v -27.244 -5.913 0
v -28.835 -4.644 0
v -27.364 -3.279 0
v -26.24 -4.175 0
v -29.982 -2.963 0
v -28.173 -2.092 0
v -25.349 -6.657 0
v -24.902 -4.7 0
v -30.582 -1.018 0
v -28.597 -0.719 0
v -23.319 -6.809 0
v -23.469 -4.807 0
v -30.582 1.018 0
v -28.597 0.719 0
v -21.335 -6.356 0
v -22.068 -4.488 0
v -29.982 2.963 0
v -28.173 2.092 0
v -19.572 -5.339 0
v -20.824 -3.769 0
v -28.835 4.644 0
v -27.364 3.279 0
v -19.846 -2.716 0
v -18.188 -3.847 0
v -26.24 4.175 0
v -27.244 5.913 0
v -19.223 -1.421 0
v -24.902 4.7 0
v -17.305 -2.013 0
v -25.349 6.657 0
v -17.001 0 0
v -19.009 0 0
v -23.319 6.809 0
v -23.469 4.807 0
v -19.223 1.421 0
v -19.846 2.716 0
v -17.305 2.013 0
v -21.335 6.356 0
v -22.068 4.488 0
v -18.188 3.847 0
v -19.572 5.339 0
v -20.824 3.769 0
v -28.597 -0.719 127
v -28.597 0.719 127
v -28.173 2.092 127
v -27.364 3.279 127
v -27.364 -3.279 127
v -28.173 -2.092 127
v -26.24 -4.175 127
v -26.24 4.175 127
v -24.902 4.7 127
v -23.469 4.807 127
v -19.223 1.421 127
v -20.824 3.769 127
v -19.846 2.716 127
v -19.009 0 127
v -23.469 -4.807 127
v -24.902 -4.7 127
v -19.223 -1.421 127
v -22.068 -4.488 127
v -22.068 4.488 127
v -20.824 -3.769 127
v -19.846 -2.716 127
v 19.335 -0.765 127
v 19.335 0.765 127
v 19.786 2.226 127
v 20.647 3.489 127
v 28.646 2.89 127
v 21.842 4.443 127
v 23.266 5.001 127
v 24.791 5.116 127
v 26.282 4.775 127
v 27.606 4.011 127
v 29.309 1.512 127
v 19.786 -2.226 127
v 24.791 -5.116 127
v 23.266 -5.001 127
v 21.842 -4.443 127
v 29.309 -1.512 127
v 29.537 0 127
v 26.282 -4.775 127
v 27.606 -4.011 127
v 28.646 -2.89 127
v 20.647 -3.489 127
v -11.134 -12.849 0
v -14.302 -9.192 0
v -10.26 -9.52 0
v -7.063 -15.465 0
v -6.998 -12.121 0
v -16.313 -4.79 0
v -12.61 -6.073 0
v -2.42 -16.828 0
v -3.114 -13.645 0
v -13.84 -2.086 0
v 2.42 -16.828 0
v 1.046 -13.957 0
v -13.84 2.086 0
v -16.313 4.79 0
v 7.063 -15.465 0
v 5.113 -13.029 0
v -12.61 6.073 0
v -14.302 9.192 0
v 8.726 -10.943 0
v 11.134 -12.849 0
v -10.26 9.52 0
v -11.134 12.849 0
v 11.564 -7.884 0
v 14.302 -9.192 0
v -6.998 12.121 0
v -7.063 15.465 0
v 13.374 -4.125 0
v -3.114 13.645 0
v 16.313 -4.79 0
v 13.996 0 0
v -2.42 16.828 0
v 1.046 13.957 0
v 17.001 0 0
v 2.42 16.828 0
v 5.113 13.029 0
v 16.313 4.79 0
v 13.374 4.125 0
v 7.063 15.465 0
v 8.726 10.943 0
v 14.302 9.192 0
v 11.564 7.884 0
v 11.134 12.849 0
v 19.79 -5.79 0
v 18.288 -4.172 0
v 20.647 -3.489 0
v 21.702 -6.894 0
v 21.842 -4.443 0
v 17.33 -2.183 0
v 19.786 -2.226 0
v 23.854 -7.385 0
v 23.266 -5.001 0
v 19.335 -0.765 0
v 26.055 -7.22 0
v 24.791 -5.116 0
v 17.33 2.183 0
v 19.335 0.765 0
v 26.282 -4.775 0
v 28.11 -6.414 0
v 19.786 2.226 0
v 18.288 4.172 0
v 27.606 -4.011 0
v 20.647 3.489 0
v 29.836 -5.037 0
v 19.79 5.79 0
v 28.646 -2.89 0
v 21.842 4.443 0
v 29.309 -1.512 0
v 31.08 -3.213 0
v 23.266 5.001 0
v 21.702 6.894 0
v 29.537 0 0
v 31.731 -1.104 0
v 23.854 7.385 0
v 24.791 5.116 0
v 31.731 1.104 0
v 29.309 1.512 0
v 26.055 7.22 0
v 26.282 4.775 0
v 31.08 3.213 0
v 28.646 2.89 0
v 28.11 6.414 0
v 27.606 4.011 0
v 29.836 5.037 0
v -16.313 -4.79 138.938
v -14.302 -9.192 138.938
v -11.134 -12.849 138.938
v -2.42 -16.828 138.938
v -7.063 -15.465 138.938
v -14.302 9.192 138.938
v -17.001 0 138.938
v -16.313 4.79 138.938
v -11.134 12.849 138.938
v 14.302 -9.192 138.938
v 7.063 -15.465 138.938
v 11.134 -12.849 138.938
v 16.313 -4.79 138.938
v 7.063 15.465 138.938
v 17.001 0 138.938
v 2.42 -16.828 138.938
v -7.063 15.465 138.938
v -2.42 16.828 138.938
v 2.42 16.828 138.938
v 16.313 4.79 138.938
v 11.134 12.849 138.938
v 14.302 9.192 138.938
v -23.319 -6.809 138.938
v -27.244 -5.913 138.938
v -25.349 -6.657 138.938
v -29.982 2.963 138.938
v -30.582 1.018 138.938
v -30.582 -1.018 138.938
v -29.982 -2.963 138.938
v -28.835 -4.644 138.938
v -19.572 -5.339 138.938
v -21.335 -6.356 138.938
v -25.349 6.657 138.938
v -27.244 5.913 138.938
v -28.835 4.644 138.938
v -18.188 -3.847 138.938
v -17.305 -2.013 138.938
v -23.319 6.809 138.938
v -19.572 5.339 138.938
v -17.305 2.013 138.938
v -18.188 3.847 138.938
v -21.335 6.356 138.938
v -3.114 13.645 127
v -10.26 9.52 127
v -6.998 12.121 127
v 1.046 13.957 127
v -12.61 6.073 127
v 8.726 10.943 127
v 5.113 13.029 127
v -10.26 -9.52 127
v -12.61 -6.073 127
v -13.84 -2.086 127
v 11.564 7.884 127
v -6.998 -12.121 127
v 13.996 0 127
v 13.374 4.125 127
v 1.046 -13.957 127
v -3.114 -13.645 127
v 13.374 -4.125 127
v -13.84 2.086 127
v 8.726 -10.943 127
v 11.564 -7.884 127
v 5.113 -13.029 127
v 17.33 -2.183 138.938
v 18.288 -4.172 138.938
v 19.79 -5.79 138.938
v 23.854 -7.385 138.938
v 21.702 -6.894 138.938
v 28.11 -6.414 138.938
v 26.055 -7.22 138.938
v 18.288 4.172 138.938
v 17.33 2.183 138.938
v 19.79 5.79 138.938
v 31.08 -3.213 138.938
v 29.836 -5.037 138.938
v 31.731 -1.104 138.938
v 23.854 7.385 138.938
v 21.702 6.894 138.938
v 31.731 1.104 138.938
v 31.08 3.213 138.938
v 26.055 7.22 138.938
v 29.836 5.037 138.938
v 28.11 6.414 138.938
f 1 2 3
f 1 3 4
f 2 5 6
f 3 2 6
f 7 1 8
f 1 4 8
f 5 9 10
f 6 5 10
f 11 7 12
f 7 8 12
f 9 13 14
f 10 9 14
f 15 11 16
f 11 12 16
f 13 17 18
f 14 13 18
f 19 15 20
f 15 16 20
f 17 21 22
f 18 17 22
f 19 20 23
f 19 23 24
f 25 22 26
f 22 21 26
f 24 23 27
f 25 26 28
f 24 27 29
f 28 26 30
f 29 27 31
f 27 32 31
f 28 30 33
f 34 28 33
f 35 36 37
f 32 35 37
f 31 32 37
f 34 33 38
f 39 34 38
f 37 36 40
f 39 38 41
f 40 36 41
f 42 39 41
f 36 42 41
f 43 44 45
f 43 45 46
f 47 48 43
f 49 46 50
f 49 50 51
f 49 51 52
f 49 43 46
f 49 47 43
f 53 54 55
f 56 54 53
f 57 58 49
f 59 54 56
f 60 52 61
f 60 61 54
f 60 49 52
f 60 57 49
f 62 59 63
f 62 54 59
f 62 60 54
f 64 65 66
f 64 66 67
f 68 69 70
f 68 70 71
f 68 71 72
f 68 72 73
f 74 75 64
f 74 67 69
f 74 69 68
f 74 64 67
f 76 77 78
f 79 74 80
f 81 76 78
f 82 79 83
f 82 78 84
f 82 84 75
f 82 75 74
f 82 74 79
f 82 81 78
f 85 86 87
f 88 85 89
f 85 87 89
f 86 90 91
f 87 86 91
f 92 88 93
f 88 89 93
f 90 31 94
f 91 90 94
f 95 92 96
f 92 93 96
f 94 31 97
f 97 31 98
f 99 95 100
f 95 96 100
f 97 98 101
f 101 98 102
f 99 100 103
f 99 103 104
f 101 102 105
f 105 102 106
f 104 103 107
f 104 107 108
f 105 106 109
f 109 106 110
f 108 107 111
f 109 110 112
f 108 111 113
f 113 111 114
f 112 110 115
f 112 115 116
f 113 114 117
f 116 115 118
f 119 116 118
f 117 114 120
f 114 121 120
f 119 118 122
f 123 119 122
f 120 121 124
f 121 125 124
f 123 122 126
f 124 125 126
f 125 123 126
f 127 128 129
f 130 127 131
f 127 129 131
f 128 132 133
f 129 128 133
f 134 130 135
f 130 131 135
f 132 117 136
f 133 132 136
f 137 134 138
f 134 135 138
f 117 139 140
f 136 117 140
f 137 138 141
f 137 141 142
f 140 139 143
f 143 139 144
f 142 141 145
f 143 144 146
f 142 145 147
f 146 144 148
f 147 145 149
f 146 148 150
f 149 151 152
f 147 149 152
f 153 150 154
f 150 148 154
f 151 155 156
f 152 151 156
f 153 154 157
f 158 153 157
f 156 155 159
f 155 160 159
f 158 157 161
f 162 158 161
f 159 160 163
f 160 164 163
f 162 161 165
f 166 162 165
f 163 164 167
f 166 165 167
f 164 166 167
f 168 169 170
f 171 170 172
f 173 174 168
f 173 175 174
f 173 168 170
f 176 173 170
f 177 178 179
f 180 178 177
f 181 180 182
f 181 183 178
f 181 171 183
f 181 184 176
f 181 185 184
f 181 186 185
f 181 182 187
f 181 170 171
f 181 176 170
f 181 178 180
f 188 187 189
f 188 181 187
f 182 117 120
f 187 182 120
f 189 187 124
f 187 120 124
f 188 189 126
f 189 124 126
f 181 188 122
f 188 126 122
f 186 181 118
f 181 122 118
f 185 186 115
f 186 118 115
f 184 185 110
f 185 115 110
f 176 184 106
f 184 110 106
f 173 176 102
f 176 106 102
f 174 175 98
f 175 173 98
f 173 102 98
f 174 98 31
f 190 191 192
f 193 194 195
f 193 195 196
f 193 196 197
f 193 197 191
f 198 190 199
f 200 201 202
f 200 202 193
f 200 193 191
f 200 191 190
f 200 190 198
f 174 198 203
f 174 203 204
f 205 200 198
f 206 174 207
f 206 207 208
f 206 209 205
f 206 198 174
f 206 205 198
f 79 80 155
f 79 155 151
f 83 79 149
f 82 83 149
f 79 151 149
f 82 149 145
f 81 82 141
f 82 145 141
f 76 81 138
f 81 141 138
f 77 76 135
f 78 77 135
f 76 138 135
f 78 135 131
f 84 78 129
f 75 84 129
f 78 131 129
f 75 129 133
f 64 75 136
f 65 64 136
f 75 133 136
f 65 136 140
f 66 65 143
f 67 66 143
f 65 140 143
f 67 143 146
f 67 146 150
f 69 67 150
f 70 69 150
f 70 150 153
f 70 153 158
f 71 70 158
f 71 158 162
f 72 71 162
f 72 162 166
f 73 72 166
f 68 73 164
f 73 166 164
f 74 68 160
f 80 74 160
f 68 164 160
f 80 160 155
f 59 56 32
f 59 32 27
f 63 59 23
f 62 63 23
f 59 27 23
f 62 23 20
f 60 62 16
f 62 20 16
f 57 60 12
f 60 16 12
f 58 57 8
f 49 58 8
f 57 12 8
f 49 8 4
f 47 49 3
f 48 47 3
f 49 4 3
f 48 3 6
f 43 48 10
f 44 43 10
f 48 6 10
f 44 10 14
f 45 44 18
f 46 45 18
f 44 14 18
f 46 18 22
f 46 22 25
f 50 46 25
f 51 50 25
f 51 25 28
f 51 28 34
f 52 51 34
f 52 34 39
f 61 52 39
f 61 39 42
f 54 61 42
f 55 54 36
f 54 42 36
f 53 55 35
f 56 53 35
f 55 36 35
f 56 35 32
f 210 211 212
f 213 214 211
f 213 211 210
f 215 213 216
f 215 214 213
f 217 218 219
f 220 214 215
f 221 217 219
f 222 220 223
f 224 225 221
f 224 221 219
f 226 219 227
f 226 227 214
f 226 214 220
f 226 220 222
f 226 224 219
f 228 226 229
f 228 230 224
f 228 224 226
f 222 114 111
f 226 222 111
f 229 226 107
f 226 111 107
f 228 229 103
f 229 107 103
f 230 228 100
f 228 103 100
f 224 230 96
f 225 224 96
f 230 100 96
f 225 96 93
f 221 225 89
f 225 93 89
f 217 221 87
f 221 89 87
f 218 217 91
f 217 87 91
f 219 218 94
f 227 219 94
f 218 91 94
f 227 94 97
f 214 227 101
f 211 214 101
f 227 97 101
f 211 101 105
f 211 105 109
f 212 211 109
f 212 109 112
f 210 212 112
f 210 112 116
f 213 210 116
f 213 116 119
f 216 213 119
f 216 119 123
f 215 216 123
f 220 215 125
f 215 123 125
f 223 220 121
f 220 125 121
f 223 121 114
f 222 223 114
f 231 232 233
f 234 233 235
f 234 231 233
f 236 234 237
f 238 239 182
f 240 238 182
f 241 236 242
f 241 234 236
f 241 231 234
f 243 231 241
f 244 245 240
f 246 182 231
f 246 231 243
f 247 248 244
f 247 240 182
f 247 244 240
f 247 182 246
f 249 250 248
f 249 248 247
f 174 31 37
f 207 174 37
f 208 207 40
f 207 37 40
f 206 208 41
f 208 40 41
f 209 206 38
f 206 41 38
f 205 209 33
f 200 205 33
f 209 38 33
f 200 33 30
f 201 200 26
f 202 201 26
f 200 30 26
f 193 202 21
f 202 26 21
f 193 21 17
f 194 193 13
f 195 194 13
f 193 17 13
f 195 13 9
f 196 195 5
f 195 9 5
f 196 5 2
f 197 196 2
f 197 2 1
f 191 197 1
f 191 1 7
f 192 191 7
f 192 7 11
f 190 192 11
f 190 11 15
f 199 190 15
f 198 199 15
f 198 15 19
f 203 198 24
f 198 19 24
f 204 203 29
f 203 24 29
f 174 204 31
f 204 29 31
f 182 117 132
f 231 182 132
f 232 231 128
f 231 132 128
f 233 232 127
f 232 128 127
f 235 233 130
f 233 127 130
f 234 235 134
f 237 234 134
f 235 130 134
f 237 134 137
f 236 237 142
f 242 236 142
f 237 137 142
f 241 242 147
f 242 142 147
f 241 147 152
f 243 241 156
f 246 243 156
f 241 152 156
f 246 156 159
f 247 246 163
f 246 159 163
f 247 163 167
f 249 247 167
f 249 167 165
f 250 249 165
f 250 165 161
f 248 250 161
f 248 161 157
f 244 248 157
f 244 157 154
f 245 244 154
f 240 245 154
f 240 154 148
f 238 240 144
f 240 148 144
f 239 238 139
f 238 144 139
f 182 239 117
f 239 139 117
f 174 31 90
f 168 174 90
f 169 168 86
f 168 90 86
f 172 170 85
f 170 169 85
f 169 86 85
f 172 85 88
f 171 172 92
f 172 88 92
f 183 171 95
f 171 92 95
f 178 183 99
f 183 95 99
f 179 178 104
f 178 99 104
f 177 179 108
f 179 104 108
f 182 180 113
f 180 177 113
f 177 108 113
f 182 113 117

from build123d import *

# Parameters (mm, degrees)
F0_R     = 6.828287
F1_DEPTH = 138.938
F2_R     = 13.996202
F3_DEPTH = 127
F4_R     = 5.1299
F5_DEPTH = 127
F6_R     = 4.820977
F7_DEPTH = 127


with BuildPart() as f1:
    # F0 (on Top) → F1 (new body)
    with BuildSketch(Plane.XY):
        with BuildLine():
            ThreePointArc((-17.001406, 0), (0, -17.001406), (17.001406, 0))
            ThreePointArc((17.001406, 0), (0, 17.001406), (-17.001406, 0))
        make_face()
        with BuildLine():
            ThreePointArc((31.81336, 0), (24.407383, 7.405977), (17.001406, 0))
            ThreePointArc((17.001406, 0), (24.407383, -7.405977), (31.81336, 0))
        make_face()
        with Locations((-23.829693, 0)):
            Circle(F0_R)
    extrude(amount=F1_DEPTH)

    # F2 (on face) → F3 (cut)
    with BuildSketch(Plane(origin=(0, 0, 0), x_dir=(1, 0, 0), z_dir=(0, 0, -1))):
        Circle(F2_R)
    extrude(amount=-F3_DEPTH, mode=Mode.SUBTRACT)

    # F4 (on face) → F5 (cut)
    with BuildSketch(Plane(origin=(0, 0, 0), x_dir=(1, 0, 0), z_dir=(0, 0, -1))):
        with Locations((24.407383, 0)):
            Circle(F4_R)
    extrude(amount=-F5_DEPTH, mode=Mode.SUBTRACT)

    # F6 (on face) → F7 (cut)
    with BuildSketch(Plane(origin=(0, 0, 0), x_dir=(1, 0, 0), z_dir=(0, 0, -1))):
        with Locations((-23.829693, 0)):
            Circle(F6_R)
    extrude(amount=-F7_DEPTH, mode=Mode.SUBTRACT)


solid = f1.part
